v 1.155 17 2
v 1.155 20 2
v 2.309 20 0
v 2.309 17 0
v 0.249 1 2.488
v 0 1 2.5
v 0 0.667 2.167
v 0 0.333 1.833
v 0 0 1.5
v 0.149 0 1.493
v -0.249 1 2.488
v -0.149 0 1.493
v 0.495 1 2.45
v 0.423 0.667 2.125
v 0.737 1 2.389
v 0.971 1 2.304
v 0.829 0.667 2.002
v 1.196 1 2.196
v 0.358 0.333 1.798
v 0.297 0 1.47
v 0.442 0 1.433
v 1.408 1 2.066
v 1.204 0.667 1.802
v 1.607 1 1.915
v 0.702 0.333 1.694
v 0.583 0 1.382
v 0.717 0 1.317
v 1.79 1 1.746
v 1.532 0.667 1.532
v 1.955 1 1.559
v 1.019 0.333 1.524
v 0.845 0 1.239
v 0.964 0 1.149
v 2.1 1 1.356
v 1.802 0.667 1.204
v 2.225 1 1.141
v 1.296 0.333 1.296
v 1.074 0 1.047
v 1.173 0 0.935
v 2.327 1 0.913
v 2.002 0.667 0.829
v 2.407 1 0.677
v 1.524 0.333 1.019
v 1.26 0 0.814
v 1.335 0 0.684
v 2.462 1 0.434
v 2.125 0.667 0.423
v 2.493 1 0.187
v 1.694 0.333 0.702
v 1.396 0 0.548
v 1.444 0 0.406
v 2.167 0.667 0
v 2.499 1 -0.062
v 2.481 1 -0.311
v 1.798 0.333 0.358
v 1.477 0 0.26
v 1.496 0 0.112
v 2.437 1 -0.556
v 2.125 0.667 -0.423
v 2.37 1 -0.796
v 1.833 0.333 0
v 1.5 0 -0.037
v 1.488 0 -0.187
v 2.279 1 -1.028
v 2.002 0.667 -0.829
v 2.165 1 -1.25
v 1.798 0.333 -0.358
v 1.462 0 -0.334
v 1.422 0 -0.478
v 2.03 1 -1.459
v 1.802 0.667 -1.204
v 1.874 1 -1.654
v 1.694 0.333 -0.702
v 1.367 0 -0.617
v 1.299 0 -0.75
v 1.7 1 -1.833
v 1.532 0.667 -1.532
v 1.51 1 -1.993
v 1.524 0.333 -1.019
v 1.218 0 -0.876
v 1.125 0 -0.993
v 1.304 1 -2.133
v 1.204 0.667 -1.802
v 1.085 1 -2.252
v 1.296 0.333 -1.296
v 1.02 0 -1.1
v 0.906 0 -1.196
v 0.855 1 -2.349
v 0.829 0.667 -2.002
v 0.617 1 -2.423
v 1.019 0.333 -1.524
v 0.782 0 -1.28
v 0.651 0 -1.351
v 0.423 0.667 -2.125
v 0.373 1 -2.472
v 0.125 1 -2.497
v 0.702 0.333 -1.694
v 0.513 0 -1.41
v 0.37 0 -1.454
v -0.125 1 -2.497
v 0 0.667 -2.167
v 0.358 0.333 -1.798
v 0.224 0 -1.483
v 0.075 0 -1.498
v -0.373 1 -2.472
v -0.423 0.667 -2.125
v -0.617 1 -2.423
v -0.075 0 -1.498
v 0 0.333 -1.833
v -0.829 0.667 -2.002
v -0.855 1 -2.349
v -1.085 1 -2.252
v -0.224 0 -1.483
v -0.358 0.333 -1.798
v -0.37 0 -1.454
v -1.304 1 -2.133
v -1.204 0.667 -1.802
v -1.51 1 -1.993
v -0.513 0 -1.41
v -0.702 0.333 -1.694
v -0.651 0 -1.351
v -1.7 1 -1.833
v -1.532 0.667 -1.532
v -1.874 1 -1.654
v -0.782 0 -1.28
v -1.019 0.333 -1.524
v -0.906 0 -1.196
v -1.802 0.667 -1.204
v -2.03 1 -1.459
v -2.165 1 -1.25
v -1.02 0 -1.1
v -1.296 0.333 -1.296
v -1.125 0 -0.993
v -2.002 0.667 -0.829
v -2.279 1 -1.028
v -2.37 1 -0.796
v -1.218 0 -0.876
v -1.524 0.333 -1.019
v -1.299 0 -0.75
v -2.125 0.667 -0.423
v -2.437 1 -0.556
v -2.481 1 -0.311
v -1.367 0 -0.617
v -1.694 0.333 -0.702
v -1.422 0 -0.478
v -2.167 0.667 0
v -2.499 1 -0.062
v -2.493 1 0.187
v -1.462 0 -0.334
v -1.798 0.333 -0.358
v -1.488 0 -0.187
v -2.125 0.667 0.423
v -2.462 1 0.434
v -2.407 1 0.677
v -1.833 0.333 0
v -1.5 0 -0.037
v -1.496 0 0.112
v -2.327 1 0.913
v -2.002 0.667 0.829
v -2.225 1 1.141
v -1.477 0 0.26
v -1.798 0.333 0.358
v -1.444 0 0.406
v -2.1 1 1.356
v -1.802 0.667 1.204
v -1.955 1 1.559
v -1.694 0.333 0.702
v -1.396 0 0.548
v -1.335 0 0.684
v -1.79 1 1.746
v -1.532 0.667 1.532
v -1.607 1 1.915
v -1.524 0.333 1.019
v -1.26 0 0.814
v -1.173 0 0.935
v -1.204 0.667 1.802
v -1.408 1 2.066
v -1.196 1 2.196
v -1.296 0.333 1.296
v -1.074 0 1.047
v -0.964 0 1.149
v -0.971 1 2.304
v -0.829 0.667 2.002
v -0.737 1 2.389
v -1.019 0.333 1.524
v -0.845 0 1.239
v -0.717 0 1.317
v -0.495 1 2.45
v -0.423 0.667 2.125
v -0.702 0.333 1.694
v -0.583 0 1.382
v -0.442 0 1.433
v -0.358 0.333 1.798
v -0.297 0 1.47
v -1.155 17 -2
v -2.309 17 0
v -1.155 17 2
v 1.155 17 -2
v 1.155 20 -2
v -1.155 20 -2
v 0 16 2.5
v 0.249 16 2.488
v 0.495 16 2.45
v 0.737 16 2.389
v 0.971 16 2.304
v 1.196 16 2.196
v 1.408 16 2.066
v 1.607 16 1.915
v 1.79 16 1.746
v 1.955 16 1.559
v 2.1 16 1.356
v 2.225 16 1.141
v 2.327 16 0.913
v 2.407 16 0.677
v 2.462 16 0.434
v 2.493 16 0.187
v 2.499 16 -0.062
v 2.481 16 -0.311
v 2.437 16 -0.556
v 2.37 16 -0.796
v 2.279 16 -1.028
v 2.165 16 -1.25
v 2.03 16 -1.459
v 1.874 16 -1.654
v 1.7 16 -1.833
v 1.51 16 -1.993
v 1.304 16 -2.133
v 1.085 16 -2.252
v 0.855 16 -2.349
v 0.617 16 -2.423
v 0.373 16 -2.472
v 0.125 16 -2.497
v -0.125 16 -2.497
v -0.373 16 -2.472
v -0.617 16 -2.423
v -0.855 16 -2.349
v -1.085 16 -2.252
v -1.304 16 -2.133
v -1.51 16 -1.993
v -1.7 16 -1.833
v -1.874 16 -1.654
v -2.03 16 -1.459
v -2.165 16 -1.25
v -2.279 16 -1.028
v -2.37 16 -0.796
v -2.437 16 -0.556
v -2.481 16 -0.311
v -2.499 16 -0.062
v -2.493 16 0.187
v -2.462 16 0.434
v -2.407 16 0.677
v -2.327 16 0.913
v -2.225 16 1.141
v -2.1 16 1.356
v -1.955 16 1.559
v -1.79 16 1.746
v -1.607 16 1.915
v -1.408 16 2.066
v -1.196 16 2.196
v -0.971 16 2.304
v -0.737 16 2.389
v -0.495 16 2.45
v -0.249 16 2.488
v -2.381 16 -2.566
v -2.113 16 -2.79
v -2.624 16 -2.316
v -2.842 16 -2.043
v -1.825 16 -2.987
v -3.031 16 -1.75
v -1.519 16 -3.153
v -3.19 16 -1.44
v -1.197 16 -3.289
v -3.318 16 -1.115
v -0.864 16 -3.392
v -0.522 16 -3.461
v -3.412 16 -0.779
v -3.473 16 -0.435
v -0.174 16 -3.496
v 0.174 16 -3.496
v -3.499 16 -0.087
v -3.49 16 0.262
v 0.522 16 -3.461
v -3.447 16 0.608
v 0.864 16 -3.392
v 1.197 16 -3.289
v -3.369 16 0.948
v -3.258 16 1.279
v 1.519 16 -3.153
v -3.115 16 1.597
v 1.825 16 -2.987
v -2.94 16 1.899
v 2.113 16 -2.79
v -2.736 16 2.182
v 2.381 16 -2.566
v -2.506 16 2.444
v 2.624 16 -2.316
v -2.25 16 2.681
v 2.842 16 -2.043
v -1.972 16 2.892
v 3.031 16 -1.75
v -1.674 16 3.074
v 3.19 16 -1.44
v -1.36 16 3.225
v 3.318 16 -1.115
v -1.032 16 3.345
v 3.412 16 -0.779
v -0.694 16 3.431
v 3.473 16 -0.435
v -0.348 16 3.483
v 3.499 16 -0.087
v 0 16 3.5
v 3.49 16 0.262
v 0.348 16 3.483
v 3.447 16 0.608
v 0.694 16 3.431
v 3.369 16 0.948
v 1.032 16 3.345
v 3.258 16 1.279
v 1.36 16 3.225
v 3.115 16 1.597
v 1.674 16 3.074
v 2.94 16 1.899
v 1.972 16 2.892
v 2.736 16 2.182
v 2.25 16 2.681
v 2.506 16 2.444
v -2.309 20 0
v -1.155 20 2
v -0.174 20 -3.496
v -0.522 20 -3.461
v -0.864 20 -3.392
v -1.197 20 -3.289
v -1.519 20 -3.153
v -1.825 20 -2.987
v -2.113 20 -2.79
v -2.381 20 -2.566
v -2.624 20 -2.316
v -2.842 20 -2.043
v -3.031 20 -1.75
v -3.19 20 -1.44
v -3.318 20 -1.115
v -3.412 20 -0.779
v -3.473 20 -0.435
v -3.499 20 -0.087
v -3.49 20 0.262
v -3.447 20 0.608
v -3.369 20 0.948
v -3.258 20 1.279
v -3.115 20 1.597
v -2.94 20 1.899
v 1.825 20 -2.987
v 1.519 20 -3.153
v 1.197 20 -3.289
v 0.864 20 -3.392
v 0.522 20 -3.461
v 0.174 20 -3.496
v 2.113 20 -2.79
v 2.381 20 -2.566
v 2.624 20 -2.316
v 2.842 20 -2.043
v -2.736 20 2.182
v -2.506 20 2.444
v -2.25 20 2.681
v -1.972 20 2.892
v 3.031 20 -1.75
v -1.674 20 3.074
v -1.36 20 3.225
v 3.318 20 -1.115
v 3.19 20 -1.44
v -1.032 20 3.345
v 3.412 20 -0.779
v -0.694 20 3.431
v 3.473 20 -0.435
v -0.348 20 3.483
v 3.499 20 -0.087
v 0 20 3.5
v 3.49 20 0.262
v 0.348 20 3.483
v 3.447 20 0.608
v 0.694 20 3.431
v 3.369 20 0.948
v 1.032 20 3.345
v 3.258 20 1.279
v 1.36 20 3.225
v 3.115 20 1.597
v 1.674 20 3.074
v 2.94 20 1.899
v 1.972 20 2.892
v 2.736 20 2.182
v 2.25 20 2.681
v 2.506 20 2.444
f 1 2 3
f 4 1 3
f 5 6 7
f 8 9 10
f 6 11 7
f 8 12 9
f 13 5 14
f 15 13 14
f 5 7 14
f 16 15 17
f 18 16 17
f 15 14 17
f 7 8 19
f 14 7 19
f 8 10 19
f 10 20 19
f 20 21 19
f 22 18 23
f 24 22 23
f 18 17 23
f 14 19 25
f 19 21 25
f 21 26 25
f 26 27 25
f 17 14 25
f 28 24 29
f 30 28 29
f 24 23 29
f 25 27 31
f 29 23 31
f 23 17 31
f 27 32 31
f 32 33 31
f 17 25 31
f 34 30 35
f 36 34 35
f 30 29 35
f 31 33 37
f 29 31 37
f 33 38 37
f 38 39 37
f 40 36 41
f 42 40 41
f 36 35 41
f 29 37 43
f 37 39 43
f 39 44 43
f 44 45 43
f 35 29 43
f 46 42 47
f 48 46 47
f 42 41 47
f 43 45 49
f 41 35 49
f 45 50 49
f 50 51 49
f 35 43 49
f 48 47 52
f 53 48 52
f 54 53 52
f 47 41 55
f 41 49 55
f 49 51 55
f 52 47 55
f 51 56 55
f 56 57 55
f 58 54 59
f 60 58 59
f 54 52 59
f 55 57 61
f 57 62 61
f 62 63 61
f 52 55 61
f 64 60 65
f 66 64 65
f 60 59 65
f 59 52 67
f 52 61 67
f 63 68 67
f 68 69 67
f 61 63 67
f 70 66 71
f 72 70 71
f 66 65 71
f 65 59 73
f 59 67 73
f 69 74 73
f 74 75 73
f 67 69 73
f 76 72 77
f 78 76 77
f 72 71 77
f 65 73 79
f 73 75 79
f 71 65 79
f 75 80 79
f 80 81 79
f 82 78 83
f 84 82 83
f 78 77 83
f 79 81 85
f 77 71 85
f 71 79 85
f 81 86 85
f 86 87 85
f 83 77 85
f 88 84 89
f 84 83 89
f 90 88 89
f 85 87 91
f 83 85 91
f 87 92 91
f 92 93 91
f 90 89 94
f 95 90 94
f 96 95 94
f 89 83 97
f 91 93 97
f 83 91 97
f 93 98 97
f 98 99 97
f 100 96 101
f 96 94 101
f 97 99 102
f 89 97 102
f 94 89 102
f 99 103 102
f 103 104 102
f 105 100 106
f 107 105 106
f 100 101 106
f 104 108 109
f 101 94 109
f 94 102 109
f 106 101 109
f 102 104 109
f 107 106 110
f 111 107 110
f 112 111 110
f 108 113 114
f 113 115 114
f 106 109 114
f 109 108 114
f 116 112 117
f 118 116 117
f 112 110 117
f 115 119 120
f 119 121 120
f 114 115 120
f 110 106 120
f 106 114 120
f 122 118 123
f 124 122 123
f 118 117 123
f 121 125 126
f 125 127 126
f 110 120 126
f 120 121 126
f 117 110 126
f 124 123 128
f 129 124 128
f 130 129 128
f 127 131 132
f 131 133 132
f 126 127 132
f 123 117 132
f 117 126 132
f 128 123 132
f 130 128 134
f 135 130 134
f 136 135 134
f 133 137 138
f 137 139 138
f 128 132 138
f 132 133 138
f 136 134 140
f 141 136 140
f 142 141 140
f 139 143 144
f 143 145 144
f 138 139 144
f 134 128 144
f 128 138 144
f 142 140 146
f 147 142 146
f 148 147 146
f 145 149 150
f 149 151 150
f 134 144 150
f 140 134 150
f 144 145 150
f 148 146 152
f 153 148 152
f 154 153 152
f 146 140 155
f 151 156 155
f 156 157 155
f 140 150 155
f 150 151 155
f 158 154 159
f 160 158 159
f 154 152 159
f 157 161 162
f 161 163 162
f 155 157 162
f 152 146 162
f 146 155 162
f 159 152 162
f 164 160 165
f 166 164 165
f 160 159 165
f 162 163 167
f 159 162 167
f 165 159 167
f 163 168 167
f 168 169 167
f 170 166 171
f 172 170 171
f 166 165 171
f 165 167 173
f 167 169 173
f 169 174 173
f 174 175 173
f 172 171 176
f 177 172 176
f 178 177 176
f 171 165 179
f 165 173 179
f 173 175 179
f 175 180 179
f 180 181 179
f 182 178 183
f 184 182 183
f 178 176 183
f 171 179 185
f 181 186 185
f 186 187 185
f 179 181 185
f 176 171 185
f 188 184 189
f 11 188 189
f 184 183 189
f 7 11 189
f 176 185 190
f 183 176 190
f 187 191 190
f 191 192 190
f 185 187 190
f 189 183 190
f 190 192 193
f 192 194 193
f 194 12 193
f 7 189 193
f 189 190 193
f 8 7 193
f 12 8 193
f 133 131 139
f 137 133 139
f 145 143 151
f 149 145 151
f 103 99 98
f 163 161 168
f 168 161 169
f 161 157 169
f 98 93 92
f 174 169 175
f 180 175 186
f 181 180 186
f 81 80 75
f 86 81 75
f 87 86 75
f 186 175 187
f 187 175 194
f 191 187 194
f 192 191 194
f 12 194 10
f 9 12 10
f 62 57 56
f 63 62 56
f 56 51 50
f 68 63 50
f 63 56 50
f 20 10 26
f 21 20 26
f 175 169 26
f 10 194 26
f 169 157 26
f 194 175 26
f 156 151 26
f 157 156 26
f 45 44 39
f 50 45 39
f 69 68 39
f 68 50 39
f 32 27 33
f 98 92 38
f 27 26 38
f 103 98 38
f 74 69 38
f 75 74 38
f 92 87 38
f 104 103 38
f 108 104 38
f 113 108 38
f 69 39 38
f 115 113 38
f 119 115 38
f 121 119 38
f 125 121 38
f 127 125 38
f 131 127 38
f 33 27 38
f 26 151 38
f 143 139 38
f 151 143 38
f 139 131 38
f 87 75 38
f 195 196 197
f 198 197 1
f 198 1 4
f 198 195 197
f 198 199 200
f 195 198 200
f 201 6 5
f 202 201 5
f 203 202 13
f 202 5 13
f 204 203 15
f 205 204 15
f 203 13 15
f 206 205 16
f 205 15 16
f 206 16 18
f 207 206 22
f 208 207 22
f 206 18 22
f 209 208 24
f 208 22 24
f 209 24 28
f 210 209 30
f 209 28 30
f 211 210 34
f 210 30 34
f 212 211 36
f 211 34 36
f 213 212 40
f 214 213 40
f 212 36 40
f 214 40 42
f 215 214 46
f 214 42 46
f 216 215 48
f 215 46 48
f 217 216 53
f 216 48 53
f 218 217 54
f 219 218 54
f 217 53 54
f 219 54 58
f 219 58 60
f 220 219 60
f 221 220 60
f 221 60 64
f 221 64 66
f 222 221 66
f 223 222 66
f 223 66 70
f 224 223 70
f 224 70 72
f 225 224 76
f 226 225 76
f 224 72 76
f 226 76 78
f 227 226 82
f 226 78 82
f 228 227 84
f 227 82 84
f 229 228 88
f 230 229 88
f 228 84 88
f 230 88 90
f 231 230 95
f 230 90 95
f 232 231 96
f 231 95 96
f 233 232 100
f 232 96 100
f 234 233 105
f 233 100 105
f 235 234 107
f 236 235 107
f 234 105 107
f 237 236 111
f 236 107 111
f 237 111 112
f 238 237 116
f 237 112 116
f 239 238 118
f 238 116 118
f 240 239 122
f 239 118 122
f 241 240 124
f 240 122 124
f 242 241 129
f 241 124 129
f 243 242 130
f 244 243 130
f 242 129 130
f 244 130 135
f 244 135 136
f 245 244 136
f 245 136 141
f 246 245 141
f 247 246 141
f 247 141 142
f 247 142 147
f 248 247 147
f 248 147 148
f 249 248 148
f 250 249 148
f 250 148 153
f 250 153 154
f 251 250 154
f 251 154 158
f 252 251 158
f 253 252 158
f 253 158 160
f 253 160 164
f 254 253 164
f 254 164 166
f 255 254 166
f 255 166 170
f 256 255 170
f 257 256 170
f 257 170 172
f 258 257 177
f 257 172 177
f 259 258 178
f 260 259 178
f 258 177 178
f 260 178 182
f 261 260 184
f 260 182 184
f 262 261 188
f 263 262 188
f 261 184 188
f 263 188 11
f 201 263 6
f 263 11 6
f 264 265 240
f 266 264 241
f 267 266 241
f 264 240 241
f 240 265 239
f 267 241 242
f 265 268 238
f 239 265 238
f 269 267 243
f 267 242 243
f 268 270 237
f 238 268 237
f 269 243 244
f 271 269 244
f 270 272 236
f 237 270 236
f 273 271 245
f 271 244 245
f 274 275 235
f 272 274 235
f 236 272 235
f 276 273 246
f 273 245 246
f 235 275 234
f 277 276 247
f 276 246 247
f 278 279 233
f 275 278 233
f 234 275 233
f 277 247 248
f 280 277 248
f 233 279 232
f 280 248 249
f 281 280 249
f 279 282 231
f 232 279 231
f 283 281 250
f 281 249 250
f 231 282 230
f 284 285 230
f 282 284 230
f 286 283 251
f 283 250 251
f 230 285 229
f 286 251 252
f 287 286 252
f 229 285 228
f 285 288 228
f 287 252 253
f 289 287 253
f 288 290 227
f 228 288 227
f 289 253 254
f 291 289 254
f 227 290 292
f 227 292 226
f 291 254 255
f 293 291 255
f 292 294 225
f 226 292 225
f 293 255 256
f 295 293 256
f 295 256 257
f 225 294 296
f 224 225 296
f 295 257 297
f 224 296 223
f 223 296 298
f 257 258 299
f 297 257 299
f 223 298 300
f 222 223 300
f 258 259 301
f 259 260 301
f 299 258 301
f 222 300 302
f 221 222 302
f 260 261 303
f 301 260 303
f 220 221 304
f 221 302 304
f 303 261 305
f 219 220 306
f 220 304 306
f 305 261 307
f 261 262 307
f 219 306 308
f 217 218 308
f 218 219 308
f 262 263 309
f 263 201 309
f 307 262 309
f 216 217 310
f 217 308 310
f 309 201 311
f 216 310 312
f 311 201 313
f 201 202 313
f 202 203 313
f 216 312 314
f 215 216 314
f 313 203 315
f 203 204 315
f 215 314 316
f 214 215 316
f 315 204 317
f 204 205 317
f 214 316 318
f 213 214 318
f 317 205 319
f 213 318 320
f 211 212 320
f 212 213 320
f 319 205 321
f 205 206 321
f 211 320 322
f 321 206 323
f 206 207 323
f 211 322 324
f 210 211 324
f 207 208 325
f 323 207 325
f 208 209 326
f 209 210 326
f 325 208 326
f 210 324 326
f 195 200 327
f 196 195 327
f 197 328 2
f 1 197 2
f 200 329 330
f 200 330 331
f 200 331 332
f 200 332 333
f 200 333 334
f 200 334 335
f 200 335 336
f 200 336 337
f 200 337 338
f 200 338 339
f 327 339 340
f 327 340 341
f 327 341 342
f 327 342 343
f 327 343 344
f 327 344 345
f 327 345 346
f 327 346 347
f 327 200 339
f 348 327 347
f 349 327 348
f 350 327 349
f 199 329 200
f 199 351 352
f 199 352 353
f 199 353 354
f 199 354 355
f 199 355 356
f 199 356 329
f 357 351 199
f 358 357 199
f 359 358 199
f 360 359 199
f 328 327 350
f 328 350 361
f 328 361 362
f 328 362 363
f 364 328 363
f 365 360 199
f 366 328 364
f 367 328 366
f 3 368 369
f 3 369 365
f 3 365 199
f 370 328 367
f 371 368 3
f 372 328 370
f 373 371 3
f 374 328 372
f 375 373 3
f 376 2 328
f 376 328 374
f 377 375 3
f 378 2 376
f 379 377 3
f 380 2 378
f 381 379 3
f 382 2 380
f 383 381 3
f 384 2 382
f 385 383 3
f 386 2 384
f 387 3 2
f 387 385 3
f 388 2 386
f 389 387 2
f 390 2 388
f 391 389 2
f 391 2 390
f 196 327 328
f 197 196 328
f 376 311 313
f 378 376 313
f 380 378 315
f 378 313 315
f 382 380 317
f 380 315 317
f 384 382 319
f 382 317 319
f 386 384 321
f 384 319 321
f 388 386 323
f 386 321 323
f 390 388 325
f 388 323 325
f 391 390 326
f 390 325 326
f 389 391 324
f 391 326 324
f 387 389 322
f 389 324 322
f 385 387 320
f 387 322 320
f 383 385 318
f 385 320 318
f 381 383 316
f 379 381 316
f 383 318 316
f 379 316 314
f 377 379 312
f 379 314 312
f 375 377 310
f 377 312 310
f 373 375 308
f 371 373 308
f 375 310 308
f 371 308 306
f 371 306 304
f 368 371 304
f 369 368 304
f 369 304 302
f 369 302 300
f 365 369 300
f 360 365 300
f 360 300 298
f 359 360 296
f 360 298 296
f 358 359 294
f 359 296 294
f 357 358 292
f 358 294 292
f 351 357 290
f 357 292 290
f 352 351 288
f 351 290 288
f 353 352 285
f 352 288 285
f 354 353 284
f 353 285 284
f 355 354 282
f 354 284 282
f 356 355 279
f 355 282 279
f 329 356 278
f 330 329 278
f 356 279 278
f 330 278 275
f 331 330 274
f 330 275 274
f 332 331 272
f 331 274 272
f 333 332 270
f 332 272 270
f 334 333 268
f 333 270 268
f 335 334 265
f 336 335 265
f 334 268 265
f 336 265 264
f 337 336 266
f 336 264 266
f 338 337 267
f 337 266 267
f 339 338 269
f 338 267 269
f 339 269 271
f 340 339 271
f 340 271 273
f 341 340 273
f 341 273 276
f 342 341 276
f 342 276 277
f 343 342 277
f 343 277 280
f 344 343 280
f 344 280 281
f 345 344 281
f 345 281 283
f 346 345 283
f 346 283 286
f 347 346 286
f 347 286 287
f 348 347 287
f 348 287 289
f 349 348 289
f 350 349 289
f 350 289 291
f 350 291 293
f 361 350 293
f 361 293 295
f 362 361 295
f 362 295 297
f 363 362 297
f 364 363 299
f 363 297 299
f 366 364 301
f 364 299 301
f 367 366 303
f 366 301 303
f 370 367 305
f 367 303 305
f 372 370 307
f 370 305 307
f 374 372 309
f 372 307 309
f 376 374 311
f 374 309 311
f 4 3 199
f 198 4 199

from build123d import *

# Parameters (mm, degrees)
SKETCH1_R           = 2.5
BOSS_EXTRUDE1_DEPTH = 16
SKETCH2_R           = 3.5
BOSS_EXTRUDE2_DEPTH = 4
CHAMFER1_SIZE       = 1
CUT_EXTRUDE1_DEPTH  = 3


with BuildPart() as part:
    # Sketch1 → Boss-Extrude1 (new body)
    with BuildSketch(Plane(origin=(0, 0, 0), x_dir=(1, 0, 0), z_dir=(0, 1, 0))):
        with Locations(Location((0, 0, 0), (0, 0, 270))):
            Circle(SKETCH1_R)
    extrude(amount=BOSS_EXTRUDE1_DEPTH)

    # Sketch2 → Boss-Extrude2 (add)
    with BuildSketch(Plane(origin=(0, 16, 0), x_dir=(1, 0, 0), z_dir=(0, 1, 0))):
        with Locations(Location((0, 0, 0), (0, 0, 270))):
            Circle(SKETCH2_R)
    extrude(amount=BOSS_EXTRUDE2_DEPTH)

    # Chamfer1
    chamfer1_edges = [part.edges().sort_by_distance(p)[0] for p in [
        (0, 0, -2.5),
    ]]
    chamfer(chamfer1_edges, length=CHAMFER1_SIZE)

    # Sketch3 → Cut-Extrude1 (cut)
    with BuildSketch(Plane(origin=(0, 20, 0), x_dir=(1, 0, 0), z_dir=(0, 1, 0))):
        Polygon((2.309401077, 0), (1.154700538, 2), (-1.154700538, 2), (-2.309401077, 0), (-1.154700538, -2), (1.154700538, -2), align=None)
    extrude(amount=-CUT_EXTRUDE1_DEPTH, mode=Mode.SUBTRACT)


solid = part.part
